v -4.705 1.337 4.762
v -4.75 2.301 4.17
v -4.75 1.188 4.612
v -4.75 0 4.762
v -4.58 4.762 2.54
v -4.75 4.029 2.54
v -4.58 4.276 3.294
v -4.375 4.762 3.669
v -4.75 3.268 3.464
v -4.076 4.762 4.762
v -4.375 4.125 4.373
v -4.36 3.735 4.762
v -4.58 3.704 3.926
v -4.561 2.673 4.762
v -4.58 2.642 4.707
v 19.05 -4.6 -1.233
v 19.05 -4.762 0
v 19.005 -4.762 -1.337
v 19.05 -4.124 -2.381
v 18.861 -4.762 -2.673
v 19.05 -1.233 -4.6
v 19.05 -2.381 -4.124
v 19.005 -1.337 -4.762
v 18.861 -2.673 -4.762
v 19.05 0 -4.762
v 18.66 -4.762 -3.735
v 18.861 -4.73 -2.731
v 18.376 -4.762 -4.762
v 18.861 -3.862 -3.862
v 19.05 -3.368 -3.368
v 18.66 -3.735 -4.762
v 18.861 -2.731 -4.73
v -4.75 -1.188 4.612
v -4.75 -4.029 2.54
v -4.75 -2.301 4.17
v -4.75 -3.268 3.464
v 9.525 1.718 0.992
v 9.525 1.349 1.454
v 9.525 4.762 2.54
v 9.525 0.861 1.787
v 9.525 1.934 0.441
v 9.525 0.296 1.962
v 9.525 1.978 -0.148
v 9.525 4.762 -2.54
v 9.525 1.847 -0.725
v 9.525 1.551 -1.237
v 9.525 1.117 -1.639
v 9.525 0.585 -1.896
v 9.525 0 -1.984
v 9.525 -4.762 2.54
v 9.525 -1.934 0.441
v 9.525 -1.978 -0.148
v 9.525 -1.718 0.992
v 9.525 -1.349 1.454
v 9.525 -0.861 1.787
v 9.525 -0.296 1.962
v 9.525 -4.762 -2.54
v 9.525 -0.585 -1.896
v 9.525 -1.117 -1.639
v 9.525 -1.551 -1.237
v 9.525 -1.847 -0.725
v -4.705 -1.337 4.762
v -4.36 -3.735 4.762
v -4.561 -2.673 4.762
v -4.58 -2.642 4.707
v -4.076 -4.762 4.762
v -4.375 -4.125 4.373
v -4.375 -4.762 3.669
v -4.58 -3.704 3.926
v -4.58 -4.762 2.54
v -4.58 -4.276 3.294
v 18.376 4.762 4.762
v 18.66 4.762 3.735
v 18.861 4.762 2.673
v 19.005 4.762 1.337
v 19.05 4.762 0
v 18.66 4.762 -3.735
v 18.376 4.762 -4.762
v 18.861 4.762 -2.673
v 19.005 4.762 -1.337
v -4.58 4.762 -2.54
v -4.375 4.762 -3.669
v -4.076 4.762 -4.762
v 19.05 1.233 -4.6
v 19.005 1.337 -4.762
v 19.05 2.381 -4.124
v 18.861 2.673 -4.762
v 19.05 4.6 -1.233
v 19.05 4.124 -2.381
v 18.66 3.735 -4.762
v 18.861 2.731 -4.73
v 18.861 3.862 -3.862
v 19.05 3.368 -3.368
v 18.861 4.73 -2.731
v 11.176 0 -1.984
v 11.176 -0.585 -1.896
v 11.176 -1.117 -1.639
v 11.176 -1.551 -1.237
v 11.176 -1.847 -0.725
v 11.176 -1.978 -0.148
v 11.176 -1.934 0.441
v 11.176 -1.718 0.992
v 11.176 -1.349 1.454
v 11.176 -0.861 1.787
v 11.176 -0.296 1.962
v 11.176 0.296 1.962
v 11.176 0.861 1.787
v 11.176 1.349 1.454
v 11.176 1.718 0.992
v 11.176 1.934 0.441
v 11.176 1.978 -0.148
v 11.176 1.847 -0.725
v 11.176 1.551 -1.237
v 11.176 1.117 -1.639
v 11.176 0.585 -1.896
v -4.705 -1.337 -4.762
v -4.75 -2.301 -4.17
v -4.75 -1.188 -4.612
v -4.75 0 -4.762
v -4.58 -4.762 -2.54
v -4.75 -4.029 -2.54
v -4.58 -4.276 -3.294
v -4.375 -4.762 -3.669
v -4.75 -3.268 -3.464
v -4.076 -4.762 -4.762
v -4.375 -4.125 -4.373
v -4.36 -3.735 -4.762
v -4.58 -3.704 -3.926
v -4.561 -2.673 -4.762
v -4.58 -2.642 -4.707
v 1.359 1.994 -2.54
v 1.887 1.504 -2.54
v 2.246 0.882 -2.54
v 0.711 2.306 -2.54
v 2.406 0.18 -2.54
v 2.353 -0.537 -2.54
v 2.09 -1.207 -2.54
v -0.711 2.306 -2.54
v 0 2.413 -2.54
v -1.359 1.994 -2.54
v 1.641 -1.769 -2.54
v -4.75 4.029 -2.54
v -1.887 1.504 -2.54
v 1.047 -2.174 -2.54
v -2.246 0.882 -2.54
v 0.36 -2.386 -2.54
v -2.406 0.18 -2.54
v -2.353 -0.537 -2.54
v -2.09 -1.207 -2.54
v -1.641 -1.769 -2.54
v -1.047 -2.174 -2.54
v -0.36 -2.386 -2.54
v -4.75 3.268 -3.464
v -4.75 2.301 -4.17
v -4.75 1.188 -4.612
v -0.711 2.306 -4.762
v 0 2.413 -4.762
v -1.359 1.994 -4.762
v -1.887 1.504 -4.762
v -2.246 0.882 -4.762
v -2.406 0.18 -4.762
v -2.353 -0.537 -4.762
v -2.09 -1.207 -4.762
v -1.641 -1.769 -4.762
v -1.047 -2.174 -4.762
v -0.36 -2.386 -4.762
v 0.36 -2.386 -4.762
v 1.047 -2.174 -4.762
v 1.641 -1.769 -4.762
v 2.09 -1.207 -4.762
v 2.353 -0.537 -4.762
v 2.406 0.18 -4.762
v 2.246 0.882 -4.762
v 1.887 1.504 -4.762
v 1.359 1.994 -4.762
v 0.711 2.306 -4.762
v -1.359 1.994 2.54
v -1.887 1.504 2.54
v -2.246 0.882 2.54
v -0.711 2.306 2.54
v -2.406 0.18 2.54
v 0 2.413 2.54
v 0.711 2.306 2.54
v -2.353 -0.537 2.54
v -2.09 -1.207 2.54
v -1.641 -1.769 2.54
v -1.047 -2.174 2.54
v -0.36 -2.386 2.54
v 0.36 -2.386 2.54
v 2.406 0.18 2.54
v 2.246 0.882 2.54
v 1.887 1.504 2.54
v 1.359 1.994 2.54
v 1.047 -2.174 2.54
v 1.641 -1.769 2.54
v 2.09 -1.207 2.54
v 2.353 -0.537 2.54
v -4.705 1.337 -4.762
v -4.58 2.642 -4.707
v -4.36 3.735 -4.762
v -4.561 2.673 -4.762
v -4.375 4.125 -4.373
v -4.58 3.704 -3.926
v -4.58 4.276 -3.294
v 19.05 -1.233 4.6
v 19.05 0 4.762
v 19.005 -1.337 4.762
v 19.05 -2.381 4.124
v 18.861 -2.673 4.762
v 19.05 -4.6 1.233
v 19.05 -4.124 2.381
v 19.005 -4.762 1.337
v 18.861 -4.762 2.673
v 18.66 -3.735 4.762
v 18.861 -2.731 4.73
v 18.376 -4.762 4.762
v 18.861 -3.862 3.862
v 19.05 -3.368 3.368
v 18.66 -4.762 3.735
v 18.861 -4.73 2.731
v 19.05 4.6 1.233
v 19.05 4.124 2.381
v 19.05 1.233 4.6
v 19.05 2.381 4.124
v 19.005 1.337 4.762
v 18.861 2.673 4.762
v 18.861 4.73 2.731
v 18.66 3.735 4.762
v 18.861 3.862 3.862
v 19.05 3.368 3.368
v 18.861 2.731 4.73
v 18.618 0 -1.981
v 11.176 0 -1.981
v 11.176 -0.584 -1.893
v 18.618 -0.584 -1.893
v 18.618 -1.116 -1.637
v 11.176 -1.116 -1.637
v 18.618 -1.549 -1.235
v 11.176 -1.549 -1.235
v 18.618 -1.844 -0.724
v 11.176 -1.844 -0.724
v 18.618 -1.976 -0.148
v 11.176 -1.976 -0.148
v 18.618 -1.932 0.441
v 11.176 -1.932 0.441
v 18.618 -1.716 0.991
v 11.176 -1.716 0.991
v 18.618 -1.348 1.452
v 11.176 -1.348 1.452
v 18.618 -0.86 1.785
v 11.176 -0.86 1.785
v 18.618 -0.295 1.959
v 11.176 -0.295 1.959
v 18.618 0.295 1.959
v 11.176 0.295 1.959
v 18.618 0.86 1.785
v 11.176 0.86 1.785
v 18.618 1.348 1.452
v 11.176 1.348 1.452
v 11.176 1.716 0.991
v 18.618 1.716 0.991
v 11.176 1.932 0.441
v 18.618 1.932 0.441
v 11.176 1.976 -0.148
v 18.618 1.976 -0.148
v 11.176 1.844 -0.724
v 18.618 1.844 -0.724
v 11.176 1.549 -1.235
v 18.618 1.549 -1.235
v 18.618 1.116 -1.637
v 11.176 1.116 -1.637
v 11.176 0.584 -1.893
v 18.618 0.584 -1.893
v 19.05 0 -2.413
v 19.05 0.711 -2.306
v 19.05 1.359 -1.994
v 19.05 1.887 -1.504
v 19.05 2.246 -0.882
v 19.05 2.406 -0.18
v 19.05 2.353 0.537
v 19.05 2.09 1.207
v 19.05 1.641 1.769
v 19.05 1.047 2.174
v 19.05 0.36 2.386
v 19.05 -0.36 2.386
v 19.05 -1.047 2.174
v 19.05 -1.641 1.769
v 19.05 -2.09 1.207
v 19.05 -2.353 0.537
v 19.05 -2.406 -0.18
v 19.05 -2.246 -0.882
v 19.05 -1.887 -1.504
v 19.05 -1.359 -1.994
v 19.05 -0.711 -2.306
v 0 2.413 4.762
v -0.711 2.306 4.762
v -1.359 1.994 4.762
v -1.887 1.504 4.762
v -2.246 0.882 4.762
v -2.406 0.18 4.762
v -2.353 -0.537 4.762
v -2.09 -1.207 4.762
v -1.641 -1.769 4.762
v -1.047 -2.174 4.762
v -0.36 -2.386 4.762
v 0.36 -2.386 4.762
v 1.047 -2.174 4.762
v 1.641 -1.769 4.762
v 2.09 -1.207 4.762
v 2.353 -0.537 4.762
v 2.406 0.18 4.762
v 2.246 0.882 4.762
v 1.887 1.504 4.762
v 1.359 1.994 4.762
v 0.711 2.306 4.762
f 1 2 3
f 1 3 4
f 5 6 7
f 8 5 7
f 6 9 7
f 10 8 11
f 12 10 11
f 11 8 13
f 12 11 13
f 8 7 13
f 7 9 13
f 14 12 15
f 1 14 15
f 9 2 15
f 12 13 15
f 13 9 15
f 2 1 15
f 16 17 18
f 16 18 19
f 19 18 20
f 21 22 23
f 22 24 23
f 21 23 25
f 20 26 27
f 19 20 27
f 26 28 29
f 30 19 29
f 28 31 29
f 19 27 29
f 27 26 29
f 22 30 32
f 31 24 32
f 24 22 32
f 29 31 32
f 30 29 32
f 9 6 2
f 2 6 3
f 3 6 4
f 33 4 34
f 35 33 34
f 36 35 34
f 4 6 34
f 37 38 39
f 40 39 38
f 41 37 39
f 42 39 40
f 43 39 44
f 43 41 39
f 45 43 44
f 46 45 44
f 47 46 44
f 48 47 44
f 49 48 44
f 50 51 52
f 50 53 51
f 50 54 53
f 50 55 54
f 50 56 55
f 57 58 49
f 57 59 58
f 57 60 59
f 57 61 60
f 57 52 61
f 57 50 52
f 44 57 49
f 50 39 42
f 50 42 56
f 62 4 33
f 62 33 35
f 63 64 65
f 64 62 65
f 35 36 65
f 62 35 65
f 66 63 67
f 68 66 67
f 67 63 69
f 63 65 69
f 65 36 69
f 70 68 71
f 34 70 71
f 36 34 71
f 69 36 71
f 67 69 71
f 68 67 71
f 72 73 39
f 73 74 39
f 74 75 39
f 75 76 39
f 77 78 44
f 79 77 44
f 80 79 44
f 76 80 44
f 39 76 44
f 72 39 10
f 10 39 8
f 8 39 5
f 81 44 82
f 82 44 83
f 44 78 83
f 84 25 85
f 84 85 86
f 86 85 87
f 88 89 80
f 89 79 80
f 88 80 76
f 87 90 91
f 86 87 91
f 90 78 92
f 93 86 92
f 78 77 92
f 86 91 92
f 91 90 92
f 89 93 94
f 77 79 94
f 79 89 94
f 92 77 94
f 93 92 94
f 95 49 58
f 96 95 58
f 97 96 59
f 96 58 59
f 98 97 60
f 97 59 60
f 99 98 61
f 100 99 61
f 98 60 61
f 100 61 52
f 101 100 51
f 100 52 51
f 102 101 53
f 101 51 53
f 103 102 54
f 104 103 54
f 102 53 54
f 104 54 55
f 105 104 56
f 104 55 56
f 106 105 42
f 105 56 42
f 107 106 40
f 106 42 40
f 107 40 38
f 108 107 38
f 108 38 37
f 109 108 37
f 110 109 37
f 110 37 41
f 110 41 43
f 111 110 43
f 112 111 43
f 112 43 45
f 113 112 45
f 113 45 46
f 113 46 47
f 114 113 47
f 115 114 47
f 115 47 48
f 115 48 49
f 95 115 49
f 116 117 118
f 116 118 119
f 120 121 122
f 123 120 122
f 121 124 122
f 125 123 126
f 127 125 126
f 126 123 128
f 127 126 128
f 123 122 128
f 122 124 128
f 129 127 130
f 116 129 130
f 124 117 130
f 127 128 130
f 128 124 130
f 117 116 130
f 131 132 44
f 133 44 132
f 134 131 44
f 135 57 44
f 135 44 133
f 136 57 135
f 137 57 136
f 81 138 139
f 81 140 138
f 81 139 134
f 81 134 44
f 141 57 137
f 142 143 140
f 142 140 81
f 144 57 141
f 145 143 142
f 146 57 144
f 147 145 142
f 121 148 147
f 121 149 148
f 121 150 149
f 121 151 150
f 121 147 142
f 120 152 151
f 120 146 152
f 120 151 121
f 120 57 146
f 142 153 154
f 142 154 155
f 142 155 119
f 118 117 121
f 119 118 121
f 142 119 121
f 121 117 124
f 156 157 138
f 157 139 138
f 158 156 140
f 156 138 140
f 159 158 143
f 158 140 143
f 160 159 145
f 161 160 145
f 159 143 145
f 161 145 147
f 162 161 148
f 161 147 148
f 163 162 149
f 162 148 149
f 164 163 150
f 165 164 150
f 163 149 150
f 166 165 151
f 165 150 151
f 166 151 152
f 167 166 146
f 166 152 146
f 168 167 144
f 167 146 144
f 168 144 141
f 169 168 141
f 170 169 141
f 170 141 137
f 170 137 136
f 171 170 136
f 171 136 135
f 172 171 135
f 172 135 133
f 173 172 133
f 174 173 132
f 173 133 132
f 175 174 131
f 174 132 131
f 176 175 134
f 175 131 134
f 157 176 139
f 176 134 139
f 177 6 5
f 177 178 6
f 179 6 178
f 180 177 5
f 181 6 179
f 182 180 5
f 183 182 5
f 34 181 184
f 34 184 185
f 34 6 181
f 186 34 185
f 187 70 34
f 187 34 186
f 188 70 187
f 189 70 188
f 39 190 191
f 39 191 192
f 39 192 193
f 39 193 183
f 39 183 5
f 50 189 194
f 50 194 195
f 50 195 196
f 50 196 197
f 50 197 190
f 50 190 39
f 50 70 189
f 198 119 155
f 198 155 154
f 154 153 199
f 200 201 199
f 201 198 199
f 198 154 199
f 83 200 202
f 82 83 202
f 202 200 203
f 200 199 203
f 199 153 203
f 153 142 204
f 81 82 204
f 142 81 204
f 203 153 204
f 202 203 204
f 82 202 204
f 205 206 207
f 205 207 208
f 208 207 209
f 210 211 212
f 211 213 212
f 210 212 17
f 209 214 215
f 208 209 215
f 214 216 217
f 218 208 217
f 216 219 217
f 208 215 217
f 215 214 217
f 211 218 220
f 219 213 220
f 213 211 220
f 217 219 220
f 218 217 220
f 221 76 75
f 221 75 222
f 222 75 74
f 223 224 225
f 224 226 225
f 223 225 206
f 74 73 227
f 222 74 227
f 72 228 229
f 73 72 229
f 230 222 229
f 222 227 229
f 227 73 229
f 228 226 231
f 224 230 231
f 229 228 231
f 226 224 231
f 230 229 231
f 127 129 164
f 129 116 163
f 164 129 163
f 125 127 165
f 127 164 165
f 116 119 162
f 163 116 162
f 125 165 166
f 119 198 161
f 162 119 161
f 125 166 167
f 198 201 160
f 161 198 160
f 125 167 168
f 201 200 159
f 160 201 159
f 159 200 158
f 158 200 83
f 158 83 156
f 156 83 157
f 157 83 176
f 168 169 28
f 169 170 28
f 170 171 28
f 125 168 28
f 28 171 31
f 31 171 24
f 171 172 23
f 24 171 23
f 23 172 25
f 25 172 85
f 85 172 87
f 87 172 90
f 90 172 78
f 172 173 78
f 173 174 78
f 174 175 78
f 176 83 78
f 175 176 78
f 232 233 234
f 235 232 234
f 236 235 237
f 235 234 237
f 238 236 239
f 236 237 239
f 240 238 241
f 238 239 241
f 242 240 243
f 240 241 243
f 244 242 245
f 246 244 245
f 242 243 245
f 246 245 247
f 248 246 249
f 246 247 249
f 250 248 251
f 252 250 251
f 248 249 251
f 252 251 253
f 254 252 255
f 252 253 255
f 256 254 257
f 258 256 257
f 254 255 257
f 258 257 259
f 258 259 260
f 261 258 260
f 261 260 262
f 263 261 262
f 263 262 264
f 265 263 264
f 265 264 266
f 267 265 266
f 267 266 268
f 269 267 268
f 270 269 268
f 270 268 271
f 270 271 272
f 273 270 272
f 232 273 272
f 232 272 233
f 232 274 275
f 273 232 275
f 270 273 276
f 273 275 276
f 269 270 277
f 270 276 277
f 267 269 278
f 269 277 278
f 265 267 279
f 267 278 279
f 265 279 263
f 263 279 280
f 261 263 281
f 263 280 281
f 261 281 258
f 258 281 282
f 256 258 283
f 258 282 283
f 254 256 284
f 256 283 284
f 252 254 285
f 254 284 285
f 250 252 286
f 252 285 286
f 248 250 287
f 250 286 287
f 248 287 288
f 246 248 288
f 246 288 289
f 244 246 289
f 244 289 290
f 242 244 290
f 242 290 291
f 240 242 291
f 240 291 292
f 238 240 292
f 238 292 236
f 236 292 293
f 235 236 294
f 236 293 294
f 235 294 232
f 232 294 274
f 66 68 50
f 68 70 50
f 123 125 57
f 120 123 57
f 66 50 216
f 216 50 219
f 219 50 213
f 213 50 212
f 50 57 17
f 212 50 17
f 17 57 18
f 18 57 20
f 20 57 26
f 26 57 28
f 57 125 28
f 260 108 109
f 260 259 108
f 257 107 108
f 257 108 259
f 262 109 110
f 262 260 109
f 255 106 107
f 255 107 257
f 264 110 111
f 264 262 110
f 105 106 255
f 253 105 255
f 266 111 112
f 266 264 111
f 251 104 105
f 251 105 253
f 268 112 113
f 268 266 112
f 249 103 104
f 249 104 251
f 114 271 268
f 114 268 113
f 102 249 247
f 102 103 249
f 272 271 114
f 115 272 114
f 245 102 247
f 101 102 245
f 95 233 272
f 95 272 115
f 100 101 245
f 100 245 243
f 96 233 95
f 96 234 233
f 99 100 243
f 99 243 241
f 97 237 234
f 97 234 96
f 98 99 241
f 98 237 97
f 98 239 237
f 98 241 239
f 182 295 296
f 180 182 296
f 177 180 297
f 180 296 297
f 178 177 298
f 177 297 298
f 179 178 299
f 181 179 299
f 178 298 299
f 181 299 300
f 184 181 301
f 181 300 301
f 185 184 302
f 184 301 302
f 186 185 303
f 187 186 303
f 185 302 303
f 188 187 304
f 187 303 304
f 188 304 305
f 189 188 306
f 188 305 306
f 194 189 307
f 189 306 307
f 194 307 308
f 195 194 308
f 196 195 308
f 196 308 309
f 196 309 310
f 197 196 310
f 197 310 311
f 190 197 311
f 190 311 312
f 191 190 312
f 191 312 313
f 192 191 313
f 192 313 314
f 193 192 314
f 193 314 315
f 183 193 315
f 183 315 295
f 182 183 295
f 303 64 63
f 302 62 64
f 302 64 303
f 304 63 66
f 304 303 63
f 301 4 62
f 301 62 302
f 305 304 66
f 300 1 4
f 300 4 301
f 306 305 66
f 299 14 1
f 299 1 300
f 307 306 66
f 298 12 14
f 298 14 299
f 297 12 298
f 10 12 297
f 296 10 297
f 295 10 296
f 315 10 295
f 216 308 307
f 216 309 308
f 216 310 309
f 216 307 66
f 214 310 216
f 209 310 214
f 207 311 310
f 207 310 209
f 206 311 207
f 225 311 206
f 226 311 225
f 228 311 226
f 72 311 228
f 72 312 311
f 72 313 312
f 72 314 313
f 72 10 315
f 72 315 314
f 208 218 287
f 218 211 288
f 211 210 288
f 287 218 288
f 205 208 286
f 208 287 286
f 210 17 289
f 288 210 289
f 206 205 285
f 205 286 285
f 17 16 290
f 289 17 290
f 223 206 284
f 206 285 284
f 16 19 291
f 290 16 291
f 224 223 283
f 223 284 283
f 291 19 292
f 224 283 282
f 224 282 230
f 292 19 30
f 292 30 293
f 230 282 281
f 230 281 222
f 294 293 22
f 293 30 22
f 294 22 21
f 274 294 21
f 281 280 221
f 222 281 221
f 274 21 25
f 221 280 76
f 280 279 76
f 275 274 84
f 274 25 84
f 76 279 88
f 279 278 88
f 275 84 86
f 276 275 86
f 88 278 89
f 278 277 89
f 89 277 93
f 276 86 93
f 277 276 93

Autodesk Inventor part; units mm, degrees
sketch "Sketch_1" plane through (0, 0, 0) normal (0, 0, 1) x (1, 0, 0)
  line L0 (-4.7498, 4.7625) -> (-4.7498, -4.7625)
  line L1 (-4.7498, -4.7625) -> (19.05, -4.7625)
  line L2 (19.05, -4.7625) -> (19.05, 4.7625)
  line L3 (19.05, 4.7625) -> (-4.7498, 4.7625)
extrude "Extrusion1" add sketch "Sketch_1" along normal mid plane 9.525
sketch "Sketch_2" plane through (0, 0, 0) normal (0, 1, 0) x (-1, 0, 0)
  line L0 (4.7498, -2.54) -> (4.7498, 2.54)
  line L1 (4.7498, 2.54) -> (-9.525, 2.54)
  line L2 (-9.525, 2.54) -> (-9.525, -2.54)
  line L3 (-9.525, -2.54) -> (4.7498, -2.54)
extrude "Extrusion2" cut sketch "Sketch_2" along normal mid plane 9.525
sketch "Sketch3" plane through (19.05, -4.7625, 4.7625) normal (1, 0, 0) x (0, 0, -1)
  point P0 (4.7625, 4.7625)
hole "Hole1" at (19.05, 0, 0) direction (-1, 0, 0) diameter 3.9624 depth 7.874 countersink diameter 4.826 countersink angle 90 thread size "10-32 UNF" class "2B" standard "ANSI Unified Screw Threads"
sketch "Sketch4" plane through (11.176, 0, 0) normal (1, 0, 0) x (0, 0, -1)
  point P0 (0, 0)
hole "Hole2" at (11.176, 0, 0) direction (-1, 0, 0) diameter 3.9675 depth 1.651
sketch "Sketch5" plane through (0, 0, -4.7625) normal (0, 0, -1) x (-1, 0, 0)
  point P0 (0, 0)
hole "Hole3" at (0, 0, -4.7625) direction (0, 0, 1) diameter 4.826 depth 9.525
sketch "Sketch_9" plane through (0, 0, 0) normal (0, 0, 1) x (1, 0, 0)
  line L0 (23.8125, 0) -> (19.05, 0)
  line L1 (19.05, 0) -> (19.05, 4.7625)
  arc A0 (19.05, 4.7625) -> (16.51, 9.525) centre (8.8503, 2.3812) ccw
  line L2 (16.51, 9.525) -> (23.8125, 9.525)
  line L3 (23.8125, 9.525) -> (23.8125, 0)
  line L4 (23.8125, 0) -> (19.05, 0)
revolve "Revolution1" cut sketch "Sketch_9" angle 360 about axis through (23.8125, 0, 0) along (1, 0, 0)
sketch "Sketch_10" plane through (0, 0, 0) normal (0, 0, 1) x (1, 0, 0)
  line L0 (-4.7498, 0) -> (-9.5123, 0)
  line L1 (-9.5123, 0) -> (-9.5123, 9.525)
  line L2 (-9.5123, 9.525) -> (-2.2098, 9.525)
  arc A0 (-2.2098, 9.525) -> (-4.7498, 4.7625) centre (5.4499, 2.3812) ccw
  line L3 (-4.7498, 4.7625) -> (-4.7498, 0)
  line L4 (-4.7498, 0) -> (-9.5123, 0)
revolve "Revolution2" cut sketch "Sketch_10" angle 360 about axis through (-4.7498, 0, 0) along (1, 0, 0)
ref_plane "dummy_XY" through (0, 0, 0) normal (0, 0, 1) x (1, 0, 0)
ref_plane "dummy_YZ" through (0, 0, 0) normal (1, 0, 0) x (0, 1, 0)
ref_plane "dummy_ZX" through (0, 0, 0) normal (0, 1, 0) x (0, 0, 1)
ref_plane "h1_XY" through (-4.7498, 4.7625, 0) normal (0, 0, 1) x (1, 0, 0)
ref_plane "h1_YZ" through (-4.7498, 4.7625, 0) normal (1, 0, 0) x (0, 1, 0)
ref_plane "h1_ZX" through (-4.7498, 4.7625, 0) normal (0, 1, 0) x (0, 0, 1)
ref_plane "h2_XY" through (-4.7498, -4.7625, 0) normal (0, 0, 1) x (1, 0, 0)
ref_plane "h2_YZ" through (-4.7498, -4.7625, 0) normal (1, 0, 0) x (0, 1, 0)
ref_plane "h2_ZX" through (-4.7498, -4.7625, 0) normal (0, 1, 0) x (0, 0, 1)
ref_plane "l1_XY" through (19.05, 4.7625, 0) normal (0, 0, 1) x (1, 0, 0)
ref_plane "l1_YZ" through (19.05, 4.7625, 0) normal (1, 0, 0) x (0, 1, 0)
ref_plane "l1_ZX" through (19.05, 4.7625, 0) normal (0, 1, 0) x (0, 0, 1)
ref_plane "l11_XY" through (19.05, 4.7625, 0) normal (0, 0, 1) x (1, 0, 0)
ref_plane "l11_YZ" through (19.05, 4.7625, 0) normal (1, 0, 0) x (0, 1, 0)
ref_plane "l11_ZX" through (19.05, 4.7625, 0) normal (0, 1, 0) x (0, 0, 1)
ref_plane "l12_XY" through (0, 4.7625, 0) normal (0, 0, 1) x (1, 0, 0)
ref_plane "l12_YZ" through (0, 4.7625, 0) normal (1, 0, 0) x (0, 1, 0)
ref_plane "l12_ZX" through (0, 4.7625, 0) normal (0, 1, 0) x (0, 0, 1)
ref_plane "l2_XY" through (-4.7498, 4.7625, 0) normal (0, 0, 1) x (1, 0, 0)
ref_plane "l2_YZ" through (-4.7498, 4.7625, 0) normal (1, 0, 0) x (0, 1, 0)
ref_plane "l2_ZX" through (-4.7498, 4.7625, 0) normal (0, 1, 0) x (0, 0, 1)
ref_plane "l21_XY" through (19.05, 0, 0) normal (0, 1, 0) x (1, 0, 0)
ref_plane "l21_YZ" through (19.05, 0, 0) normal (1, 0, 0) x (0, 0, -1)
ref_plane "l21_ZX" through (19.05, 0, 0) normal (0, 0, -1) x (0, 1, 0)
ref_plane "l22_XY" through (9.525, 0, 0) normal (0, 1, 0) x (1, 0, 0)
ref_plane "l22_YZ" through (9.525, 0, 0) normal (1, 0, 0) x (0, 0, -1)
ref_plane "l22_ZX" through (9.525, 0, 0) normal (0, 0, -1) x (0, 1, 0)
ref_plane "piston_rod_clevis_XY" through (19.05, 0, 0) normal (1, 0, 0) x (0, 0, -1)
ref_plane "piston_rod_clevis_YZ" through (19.05, 0, 0) normal (0, 0, -1) x (0, 1, 0)
ref_plane "piston_rod_clevis_ZX" through (19.05, 0, 0) normal (0, 1, 0) x (1, 0, 0)
ref_plane "rod_clevis_body_XY" through (0, 0, 0) normal (0, 0, 1) x (1, 0, 0)
ref_plane "rod_clevis_body_YZ" through (0, 0, 0) normal (1, 0, 0) x (0, 1, 0)
ref_plane "rod_clevis_body_ZX" through (0, 0, 0) normal (0, 1, 0) x (0, 0, 1)
ref_plane "th1_XY" through (19.05, 2.413, 0) normal (0, 0, 1) x (1, 0, 0)
ref_plane "th1_YZ" through (19.05, 2.413, 0) normal (1, 0, 0) x (0, 1, 0)
ref_plane "th1_ZX" through (19.05, 2.413, 0) normal (0, 1, 0) x (0, 0, 1)
ref_plane "th2_XY" through (19.05, -2.413, 0) normal (0, 0, 1) x (1, 0, 0)
ref_plane "th2_YZ" through (19.05, -2.413, 0) normal (1, 0, 0) x (0, 1, 0)
ref_plane "th2_ZX" through (19.05, -2.413, 0) normal (0, 1, 0) x (0, 0, 1)
ref_plane "to_cylinder_XY" through (9.525, 0, 0) normal (1, 0, 0) x (0, 0, -1)
ref_plane "to_cylinder_YZ" through (9.525, 0, 0) normal (0, 0, -1) x (0, 1, 0)
ref_plane "to_cylinder_ZX" through (9.525, 0, 0) normal (0, 1, 0) x (1, 0, 0)
ref_plane "w1_XY" through (19.05, 0, -4.7625) normal (0, 1, 0) x (1, 0, 0)
ref_plane "w1_YZ" through (19.05, 0, -4.7625) normal (1, 0, 0) x (0, 0, -1)
ref_plane "w1_ZX" through (19.05, 0, -4.7625) normal (0, 0, -1) x (0, 1, 0)
ref_plane "w11_XY" through (-4.7498, 0, -2.54) normal (0, 1, 0) x (1, 0, 0)
ref_plane "w11_YZ" through (-4.7498, 0, -2.54) normal (1, 0, 0) x (0, 0, -1)
ref_plane "w11_ZX" through (-4.7498, 0, -2.54) normal (0, 0, -1) x (0, 1, 0)
ref_plane "w12_XY" through (-4.7498, 0, 2.54) normal (0, 1, 0) x (1, 0, 0)
ref_plane "w12_YZ" through (-4.7498, 0, 2.54) normal (1, 0, 0) x (0, 0, -1)
ref_plane "w12_ZX" through (-4.7498, 0, 2.54) normal (0, 0, -1) x (0, 1, 0)
ref_plane "w2_XY" through (19.05, 0, 4.7625) normal (0, 1, 0) x (1, 0, 0)
ref_plane "w2_YZ" through (19.05, 0, 4.7625) normal (1, 0, 0) x (0, 0, -1)
ref_plane "w2_ZX" through (19.05, 0, 4.7625) normal (0, 0, -1) x (0, 1, 0)
properties part number "D-14043"
